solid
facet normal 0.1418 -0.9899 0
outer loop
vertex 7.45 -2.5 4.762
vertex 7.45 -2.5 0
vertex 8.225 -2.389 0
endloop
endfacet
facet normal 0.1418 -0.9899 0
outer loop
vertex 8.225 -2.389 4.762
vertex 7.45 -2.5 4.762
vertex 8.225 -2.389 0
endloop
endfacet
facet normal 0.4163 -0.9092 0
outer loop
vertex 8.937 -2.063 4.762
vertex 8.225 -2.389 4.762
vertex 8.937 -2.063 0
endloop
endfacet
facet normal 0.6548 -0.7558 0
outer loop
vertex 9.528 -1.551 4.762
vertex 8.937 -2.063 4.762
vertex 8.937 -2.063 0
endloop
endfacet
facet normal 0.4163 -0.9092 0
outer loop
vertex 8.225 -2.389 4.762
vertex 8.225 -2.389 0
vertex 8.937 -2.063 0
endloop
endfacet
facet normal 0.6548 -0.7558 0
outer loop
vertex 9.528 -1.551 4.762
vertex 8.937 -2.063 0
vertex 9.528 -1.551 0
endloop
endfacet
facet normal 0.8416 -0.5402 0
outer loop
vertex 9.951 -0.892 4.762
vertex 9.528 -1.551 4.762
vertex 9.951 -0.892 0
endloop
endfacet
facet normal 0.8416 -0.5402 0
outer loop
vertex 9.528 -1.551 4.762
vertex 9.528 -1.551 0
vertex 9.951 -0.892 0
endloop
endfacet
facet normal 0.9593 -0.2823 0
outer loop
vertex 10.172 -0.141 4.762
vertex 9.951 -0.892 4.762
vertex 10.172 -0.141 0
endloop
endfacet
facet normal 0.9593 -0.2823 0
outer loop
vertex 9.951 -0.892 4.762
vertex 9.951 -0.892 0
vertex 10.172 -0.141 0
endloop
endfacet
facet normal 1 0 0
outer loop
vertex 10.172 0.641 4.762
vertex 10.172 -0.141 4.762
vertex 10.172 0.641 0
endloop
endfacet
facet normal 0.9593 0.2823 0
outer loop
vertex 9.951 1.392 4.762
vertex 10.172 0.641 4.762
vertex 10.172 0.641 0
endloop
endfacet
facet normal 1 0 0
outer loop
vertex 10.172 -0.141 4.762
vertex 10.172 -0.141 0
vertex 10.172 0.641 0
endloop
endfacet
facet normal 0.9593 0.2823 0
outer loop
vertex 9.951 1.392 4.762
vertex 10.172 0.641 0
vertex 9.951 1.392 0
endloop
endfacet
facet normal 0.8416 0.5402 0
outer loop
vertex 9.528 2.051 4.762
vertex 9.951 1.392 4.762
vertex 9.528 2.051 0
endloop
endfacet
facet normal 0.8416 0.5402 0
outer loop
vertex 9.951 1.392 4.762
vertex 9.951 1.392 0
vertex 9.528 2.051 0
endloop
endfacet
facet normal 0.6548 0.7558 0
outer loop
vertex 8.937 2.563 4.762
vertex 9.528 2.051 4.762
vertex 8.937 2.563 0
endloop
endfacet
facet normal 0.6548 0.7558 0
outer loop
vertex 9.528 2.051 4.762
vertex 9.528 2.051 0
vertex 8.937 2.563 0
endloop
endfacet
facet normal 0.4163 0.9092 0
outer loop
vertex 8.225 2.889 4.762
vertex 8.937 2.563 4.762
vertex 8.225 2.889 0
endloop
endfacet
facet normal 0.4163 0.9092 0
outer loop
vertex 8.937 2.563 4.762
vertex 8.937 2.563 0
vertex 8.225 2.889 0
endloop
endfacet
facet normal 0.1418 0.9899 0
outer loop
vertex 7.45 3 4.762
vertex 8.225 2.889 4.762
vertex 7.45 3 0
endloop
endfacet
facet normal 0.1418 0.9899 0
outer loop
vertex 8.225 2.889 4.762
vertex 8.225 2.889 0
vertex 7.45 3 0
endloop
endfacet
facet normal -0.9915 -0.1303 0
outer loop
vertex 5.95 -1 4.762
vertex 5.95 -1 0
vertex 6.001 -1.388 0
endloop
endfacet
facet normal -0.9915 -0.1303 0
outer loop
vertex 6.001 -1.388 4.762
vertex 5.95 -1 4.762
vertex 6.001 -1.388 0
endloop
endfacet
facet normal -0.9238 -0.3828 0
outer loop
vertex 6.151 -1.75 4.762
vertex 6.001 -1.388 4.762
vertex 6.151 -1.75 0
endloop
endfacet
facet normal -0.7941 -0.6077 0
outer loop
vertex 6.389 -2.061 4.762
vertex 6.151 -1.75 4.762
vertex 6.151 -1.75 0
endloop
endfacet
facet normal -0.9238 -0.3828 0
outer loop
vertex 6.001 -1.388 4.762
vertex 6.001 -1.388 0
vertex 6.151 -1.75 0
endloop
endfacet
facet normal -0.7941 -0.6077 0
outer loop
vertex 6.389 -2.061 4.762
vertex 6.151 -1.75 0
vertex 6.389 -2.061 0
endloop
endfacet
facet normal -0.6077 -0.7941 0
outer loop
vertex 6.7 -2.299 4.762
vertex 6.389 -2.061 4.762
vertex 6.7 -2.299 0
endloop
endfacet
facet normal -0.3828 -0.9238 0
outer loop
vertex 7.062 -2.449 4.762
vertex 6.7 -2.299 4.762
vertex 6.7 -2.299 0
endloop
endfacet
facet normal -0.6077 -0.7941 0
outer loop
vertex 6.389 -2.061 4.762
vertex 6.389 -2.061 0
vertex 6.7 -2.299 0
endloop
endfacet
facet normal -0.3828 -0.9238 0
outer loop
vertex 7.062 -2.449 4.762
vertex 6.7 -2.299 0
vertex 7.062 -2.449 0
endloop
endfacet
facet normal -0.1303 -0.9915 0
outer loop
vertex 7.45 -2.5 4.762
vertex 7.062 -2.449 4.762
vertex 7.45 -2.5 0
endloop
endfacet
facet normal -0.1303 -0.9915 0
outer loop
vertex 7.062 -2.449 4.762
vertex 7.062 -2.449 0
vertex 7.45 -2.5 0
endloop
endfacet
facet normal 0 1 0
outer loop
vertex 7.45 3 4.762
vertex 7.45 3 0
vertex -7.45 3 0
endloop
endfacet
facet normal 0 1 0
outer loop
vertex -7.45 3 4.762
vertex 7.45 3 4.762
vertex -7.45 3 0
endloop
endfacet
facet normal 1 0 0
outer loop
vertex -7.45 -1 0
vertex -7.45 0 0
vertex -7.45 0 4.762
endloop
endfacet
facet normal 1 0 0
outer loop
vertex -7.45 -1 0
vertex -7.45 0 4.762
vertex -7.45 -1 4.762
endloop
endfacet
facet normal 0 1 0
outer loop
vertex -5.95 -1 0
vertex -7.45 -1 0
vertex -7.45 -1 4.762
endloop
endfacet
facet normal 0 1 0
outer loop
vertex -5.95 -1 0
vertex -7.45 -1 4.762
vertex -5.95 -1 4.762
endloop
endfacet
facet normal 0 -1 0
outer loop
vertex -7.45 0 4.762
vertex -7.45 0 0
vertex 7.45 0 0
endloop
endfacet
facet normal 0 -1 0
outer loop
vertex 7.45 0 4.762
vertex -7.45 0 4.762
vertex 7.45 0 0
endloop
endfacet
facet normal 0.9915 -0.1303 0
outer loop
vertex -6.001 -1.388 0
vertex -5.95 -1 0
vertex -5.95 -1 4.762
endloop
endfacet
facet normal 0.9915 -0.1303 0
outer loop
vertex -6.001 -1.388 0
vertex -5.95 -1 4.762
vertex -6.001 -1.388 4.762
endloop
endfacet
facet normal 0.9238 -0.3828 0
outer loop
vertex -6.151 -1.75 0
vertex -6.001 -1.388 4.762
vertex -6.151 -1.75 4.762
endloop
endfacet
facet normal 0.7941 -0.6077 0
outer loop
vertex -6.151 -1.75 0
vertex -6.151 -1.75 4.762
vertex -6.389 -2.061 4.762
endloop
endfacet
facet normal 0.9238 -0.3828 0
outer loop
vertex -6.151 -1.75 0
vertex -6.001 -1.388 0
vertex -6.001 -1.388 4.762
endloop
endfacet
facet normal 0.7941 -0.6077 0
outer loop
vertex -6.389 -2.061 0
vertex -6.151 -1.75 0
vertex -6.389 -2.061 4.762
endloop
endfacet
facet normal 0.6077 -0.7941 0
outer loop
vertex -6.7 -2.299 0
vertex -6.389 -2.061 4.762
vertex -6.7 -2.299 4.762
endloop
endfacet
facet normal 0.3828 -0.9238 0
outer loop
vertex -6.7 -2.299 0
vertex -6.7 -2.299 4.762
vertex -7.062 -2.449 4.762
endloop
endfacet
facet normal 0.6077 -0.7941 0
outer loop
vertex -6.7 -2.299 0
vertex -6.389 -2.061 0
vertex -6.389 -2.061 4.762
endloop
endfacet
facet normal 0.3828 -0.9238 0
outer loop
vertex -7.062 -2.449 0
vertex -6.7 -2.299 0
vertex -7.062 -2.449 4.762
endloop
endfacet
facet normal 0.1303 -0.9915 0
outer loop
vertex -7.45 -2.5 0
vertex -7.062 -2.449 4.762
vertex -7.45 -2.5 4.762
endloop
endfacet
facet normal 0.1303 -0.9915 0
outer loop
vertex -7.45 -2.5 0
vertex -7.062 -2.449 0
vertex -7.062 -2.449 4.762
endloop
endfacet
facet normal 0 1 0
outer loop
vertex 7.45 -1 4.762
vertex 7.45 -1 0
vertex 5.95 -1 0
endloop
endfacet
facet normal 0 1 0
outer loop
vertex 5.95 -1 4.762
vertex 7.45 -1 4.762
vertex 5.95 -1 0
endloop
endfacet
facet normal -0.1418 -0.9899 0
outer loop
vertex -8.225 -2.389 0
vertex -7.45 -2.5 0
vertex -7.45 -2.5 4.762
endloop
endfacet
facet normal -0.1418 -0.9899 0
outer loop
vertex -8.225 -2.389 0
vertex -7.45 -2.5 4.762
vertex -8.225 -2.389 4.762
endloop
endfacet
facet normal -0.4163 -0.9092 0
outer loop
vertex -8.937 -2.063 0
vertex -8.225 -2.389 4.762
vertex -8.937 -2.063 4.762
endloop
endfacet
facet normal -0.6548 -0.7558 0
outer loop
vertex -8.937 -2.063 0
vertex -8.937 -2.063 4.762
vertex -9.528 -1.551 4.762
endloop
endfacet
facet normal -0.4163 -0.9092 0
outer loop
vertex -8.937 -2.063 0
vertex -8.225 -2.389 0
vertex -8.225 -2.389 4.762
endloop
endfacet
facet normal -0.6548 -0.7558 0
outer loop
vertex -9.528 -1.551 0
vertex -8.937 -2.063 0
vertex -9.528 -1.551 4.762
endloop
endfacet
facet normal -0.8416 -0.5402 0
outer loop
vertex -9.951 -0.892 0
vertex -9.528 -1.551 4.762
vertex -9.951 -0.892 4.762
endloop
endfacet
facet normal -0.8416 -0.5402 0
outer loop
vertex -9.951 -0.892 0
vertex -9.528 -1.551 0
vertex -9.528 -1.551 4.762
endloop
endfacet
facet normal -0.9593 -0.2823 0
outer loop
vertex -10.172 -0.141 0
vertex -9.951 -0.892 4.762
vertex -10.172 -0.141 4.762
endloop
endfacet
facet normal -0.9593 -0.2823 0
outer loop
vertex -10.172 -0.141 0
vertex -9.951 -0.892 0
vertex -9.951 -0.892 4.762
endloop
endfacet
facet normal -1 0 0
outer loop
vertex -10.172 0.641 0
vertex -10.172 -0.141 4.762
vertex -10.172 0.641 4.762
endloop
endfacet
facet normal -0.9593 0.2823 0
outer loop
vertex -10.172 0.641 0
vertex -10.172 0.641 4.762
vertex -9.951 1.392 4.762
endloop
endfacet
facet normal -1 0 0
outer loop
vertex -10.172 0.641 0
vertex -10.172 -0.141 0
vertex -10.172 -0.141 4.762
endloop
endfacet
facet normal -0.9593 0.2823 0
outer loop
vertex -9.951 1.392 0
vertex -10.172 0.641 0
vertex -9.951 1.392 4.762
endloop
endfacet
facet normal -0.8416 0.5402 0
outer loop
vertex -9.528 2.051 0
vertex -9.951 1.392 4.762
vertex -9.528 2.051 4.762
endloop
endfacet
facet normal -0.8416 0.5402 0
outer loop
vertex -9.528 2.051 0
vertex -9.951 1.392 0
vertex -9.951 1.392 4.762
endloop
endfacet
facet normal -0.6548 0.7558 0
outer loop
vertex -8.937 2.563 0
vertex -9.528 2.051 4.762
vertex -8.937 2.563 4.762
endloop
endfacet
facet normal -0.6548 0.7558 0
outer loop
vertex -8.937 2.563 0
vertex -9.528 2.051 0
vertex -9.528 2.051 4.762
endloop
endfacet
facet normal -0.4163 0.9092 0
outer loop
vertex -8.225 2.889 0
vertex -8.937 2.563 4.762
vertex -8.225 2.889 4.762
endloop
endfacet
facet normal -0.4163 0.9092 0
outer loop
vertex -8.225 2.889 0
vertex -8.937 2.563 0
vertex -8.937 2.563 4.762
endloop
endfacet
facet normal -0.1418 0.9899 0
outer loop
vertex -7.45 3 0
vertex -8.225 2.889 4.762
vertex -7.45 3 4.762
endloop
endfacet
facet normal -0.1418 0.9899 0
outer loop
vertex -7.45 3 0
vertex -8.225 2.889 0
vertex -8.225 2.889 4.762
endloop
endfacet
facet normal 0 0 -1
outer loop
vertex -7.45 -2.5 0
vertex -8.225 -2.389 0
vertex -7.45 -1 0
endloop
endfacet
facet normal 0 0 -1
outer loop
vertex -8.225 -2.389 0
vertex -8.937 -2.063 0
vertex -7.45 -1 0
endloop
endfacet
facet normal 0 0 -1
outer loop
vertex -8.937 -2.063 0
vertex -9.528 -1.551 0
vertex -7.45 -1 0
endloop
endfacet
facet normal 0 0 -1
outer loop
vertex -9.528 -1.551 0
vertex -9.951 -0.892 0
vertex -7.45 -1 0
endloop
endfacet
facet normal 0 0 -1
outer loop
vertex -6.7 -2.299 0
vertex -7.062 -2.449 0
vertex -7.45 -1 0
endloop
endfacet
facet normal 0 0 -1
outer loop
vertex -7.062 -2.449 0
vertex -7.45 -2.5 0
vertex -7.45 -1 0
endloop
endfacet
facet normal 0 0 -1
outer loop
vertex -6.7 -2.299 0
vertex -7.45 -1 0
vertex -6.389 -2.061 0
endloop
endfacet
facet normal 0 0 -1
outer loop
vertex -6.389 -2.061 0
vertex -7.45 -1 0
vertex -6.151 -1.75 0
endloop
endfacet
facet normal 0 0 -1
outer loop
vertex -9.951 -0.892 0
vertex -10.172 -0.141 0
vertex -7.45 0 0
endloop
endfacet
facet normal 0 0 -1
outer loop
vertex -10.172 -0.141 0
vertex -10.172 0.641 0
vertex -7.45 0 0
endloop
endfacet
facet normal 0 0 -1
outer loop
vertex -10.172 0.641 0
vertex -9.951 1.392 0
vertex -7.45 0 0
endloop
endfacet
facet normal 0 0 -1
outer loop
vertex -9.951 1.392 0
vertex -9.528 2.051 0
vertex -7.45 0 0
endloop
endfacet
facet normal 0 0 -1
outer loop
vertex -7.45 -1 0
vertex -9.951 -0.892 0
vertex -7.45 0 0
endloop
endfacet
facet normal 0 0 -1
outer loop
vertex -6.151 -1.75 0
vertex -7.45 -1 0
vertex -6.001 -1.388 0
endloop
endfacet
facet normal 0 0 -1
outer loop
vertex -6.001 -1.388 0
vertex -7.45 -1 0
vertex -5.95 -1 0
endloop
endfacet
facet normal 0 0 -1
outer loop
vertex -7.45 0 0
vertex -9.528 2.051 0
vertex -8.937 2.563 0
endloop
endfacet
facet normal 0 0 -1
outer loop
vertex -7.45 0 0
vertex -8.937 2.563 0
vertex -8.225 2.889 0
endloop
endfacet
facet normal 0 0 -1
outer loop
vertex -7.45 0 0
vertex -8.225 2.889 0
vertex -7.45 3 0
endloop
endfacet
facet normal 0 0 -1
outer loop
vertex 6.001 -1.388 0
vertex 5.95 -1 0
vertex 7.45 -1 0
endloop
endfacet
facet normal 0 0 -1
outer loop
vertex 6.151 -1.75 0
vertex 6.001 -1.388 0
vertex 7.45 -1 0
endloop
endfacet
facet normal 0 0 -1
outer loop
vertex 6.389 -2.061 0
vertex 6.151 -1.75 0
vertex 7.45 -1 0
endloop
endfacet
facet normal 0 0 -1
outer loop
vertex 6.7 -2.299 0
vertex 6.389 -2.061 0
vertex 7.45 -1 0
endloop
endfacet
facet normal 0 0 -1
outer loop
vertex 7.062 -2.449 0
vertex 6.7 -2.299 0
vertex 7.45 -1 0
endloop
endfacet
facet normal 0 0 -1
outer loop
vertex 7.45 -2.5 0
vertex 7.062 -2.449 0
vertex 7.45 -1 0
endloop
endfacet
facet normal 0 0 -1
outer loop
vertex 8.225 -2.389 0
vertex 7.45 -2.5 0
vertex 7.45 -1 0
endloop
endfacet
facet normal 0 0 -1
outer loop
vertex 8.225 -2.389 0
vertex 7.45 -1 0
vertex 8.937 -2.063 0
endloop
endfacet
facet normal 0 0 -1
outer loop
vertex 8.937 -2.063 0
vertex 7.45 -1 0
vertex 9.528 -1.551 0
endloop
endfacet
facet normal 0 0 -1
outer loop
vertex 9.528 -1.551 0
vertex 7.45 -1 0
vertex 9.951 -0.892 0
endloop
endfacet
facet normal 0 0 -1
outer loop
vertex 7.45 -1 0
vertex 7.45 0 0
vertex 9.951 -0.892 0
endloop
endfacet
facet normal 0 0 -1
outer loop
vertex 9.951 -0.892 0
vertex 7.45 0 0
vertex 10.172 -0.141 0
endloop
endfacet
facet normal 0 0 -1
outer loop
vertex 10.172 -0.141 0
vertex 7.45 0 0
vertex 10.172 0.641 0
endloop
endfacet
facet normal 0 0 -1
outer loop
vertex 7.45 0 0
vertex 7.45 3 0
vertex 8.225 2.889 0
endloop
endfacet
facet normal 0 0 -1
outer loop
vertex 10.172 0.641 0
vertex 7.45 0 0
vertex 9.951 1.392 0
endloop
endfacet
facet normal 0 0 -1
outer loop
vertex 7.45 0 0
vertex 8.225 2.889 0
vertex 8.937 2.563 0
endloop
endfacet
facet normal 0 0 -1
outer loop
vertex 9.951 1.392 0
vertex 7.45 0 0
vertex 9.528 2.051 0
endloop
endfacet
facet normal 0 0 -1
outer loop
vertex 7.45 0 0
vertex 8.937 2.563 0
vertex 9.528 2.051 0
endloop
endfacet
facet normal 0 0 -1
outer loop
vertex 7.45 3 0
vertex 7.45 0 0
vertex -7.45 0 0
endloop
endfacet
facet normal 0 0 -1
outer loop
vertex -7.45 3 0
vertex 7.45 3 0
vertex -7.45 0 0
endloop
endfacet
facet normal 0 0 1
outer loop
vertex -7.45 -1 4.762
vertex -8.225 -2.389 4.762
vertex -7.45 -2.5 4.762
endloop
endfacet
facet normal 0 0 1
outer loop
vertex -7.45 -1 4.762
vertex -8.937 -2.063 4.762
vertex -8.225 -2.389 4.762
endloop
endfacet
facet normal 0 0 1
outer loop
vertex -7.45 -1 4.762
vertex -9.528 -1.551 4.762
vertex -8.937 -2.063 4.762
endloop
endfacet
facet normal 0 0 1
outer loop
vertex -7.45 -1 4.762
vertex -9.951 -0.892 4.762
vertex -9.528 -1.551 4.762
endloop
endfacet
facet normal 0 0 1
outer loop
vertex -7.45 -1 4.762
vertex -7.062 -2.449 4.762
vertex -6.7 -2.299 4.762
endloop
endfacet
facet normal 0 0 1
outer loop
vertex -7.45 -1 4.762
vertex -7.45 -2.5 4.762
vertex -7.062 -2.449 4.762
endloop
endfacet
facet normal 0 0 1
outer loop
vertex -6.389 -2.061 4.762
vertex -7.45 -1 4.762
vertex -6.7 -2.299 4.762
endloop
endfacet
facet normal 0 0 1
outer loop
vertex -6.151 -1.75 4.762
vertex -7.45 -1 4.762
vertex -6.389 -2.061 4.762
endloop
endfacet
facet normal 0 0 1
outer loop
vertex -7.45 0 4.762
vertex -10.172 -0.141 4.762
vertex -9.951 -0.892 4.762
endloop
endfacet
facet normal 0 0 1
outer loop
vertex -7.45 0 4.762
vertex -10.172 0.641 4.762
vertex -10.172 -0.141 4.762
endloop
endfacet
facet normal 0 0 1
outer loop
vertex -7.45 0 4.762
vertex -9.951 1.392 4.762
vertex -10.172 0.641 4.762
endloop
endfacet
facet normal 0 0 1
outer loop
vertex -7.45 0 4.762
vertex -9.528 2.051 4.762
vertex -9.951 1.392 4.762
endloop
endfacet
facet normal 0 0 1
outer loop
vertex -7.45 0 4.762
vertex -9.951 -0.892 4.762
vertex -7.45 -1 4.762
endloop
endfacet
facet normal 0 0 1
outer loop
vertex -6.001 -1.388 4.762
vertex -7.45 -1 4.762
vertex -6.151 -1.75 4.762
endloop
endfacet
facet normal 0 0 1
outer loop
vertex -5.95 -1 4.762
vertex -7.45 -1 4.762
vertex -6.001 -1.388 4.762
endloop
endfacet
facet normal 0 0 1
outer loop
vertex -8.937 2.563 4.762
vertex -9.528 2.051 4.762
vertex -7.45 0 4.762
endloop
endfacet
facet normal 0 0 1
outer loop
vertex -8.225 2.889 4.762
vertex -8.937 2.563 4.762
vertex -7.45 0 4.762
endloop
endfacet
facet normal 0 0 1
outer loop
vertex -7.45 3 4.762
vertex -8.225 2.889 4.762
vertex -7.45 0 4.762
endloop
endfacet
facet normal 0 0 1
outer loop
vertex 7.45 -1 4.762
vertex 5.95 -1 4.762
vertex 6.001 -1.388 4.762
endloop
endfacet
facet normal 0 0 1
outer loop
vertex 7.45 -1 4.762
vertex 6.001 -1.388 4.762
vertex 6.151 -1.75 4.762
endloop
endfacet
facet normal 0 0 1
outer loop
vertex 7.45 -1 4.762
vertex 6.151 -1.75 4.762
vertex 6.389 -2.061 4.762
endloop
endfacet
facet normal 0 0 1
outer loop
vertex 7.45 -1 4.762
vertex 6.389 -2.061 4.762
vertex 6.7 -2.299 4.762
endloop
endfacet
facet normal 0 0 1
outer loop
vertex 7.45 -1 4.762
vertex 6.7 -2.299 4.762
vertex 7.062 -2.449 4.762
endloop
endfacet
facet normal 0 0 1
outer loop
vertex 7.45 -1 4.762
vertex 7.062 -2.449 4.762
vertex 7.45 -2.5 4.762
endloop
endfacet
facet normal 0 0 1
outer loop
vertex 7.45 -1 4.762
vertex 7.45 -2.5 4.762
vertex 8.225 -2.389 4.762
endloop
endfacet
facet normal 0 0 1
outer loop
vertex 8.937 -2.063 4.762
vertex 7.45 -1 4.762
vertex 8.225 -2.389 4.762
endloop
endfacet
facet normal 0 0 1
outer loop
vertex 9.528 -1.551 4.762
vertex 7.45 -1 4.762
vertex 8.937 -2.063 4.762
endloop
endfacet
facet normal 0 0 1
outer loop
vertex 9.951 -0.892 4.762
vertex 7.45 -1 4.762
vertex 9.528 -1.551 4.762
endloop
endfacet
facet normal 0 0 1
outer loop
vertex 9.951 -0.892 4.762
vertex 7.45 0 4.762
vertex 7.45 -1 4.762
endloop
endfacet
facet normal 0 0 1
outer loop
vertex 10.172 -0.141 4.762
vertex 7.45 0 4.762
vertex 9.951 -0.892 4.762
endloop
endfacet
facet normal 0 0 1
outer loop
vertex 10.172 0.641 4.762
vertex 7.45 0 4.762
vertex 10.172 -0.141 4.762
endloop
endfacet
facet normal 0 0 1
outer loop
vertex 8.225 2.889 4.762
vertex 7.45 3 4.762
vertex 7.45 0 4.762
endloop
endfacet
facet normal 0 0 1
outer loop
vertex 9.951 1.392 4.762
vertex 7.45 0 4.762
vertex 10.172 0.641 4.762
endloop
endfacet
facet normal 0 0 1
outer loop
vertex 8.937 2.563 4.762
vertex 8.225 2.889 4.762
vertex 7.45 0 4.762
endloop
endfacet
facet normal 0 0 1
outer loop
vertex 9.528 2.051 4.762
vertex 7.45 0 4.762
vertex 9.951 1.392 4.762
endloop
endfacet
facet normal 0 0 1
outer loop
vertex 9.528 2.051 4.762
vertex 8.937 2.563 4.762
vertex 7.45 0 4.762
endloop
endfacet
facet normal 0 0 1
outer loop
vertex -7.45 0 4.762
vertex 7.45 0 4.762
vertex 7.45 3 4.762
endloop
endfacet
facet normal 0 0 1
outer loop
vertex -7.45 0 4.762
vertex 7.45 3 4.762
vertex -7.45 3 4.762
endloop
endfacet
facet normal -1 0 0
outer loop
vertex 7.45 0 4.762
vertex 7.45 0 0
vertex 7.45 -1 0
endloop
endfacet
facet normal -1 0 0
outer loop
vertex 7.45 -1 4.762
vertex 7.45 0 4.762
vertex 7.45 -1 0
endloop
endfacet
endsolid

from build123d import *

# Parameters (mm, degrees)
BOSS_EXTRUDE1_DEPTH = 4.7625


with BuildPart() as part:
    # Sketch1 → Boss-Extrude1 (new body)
    with BuildSketch(Plane.XY):
        with BuildLine():
            Line((-7.45, 3), (0, 3))
            Line((0, 3), (0, 0))
            Line((0, 0), (-7.45, 0))
            Line((-7.45, 0), (-7.45, -1))
            Line((-7.45, -1), (-5.95, -1))
            ThreePointArc((-5.95, -1), (-6.389339828, -2.060660172), (-7.45, -2.5))
            ThreePointArc((-7.45, -2.5), (-10.2, 0.25), (-7.45, 3))
        make_face()
    boss_extrude1 = extrude(amount=BOSS_EXTRUDE1_DEPTH)

    # Mirror1: Boss-Extrude1 across plane
    add(boss_extrude1.mirror(Plane(origin=(0, 0, 4.7625), x_dir=(0, 0, 1), z_dir=(-1, 0, 0))))


solid = part.part
